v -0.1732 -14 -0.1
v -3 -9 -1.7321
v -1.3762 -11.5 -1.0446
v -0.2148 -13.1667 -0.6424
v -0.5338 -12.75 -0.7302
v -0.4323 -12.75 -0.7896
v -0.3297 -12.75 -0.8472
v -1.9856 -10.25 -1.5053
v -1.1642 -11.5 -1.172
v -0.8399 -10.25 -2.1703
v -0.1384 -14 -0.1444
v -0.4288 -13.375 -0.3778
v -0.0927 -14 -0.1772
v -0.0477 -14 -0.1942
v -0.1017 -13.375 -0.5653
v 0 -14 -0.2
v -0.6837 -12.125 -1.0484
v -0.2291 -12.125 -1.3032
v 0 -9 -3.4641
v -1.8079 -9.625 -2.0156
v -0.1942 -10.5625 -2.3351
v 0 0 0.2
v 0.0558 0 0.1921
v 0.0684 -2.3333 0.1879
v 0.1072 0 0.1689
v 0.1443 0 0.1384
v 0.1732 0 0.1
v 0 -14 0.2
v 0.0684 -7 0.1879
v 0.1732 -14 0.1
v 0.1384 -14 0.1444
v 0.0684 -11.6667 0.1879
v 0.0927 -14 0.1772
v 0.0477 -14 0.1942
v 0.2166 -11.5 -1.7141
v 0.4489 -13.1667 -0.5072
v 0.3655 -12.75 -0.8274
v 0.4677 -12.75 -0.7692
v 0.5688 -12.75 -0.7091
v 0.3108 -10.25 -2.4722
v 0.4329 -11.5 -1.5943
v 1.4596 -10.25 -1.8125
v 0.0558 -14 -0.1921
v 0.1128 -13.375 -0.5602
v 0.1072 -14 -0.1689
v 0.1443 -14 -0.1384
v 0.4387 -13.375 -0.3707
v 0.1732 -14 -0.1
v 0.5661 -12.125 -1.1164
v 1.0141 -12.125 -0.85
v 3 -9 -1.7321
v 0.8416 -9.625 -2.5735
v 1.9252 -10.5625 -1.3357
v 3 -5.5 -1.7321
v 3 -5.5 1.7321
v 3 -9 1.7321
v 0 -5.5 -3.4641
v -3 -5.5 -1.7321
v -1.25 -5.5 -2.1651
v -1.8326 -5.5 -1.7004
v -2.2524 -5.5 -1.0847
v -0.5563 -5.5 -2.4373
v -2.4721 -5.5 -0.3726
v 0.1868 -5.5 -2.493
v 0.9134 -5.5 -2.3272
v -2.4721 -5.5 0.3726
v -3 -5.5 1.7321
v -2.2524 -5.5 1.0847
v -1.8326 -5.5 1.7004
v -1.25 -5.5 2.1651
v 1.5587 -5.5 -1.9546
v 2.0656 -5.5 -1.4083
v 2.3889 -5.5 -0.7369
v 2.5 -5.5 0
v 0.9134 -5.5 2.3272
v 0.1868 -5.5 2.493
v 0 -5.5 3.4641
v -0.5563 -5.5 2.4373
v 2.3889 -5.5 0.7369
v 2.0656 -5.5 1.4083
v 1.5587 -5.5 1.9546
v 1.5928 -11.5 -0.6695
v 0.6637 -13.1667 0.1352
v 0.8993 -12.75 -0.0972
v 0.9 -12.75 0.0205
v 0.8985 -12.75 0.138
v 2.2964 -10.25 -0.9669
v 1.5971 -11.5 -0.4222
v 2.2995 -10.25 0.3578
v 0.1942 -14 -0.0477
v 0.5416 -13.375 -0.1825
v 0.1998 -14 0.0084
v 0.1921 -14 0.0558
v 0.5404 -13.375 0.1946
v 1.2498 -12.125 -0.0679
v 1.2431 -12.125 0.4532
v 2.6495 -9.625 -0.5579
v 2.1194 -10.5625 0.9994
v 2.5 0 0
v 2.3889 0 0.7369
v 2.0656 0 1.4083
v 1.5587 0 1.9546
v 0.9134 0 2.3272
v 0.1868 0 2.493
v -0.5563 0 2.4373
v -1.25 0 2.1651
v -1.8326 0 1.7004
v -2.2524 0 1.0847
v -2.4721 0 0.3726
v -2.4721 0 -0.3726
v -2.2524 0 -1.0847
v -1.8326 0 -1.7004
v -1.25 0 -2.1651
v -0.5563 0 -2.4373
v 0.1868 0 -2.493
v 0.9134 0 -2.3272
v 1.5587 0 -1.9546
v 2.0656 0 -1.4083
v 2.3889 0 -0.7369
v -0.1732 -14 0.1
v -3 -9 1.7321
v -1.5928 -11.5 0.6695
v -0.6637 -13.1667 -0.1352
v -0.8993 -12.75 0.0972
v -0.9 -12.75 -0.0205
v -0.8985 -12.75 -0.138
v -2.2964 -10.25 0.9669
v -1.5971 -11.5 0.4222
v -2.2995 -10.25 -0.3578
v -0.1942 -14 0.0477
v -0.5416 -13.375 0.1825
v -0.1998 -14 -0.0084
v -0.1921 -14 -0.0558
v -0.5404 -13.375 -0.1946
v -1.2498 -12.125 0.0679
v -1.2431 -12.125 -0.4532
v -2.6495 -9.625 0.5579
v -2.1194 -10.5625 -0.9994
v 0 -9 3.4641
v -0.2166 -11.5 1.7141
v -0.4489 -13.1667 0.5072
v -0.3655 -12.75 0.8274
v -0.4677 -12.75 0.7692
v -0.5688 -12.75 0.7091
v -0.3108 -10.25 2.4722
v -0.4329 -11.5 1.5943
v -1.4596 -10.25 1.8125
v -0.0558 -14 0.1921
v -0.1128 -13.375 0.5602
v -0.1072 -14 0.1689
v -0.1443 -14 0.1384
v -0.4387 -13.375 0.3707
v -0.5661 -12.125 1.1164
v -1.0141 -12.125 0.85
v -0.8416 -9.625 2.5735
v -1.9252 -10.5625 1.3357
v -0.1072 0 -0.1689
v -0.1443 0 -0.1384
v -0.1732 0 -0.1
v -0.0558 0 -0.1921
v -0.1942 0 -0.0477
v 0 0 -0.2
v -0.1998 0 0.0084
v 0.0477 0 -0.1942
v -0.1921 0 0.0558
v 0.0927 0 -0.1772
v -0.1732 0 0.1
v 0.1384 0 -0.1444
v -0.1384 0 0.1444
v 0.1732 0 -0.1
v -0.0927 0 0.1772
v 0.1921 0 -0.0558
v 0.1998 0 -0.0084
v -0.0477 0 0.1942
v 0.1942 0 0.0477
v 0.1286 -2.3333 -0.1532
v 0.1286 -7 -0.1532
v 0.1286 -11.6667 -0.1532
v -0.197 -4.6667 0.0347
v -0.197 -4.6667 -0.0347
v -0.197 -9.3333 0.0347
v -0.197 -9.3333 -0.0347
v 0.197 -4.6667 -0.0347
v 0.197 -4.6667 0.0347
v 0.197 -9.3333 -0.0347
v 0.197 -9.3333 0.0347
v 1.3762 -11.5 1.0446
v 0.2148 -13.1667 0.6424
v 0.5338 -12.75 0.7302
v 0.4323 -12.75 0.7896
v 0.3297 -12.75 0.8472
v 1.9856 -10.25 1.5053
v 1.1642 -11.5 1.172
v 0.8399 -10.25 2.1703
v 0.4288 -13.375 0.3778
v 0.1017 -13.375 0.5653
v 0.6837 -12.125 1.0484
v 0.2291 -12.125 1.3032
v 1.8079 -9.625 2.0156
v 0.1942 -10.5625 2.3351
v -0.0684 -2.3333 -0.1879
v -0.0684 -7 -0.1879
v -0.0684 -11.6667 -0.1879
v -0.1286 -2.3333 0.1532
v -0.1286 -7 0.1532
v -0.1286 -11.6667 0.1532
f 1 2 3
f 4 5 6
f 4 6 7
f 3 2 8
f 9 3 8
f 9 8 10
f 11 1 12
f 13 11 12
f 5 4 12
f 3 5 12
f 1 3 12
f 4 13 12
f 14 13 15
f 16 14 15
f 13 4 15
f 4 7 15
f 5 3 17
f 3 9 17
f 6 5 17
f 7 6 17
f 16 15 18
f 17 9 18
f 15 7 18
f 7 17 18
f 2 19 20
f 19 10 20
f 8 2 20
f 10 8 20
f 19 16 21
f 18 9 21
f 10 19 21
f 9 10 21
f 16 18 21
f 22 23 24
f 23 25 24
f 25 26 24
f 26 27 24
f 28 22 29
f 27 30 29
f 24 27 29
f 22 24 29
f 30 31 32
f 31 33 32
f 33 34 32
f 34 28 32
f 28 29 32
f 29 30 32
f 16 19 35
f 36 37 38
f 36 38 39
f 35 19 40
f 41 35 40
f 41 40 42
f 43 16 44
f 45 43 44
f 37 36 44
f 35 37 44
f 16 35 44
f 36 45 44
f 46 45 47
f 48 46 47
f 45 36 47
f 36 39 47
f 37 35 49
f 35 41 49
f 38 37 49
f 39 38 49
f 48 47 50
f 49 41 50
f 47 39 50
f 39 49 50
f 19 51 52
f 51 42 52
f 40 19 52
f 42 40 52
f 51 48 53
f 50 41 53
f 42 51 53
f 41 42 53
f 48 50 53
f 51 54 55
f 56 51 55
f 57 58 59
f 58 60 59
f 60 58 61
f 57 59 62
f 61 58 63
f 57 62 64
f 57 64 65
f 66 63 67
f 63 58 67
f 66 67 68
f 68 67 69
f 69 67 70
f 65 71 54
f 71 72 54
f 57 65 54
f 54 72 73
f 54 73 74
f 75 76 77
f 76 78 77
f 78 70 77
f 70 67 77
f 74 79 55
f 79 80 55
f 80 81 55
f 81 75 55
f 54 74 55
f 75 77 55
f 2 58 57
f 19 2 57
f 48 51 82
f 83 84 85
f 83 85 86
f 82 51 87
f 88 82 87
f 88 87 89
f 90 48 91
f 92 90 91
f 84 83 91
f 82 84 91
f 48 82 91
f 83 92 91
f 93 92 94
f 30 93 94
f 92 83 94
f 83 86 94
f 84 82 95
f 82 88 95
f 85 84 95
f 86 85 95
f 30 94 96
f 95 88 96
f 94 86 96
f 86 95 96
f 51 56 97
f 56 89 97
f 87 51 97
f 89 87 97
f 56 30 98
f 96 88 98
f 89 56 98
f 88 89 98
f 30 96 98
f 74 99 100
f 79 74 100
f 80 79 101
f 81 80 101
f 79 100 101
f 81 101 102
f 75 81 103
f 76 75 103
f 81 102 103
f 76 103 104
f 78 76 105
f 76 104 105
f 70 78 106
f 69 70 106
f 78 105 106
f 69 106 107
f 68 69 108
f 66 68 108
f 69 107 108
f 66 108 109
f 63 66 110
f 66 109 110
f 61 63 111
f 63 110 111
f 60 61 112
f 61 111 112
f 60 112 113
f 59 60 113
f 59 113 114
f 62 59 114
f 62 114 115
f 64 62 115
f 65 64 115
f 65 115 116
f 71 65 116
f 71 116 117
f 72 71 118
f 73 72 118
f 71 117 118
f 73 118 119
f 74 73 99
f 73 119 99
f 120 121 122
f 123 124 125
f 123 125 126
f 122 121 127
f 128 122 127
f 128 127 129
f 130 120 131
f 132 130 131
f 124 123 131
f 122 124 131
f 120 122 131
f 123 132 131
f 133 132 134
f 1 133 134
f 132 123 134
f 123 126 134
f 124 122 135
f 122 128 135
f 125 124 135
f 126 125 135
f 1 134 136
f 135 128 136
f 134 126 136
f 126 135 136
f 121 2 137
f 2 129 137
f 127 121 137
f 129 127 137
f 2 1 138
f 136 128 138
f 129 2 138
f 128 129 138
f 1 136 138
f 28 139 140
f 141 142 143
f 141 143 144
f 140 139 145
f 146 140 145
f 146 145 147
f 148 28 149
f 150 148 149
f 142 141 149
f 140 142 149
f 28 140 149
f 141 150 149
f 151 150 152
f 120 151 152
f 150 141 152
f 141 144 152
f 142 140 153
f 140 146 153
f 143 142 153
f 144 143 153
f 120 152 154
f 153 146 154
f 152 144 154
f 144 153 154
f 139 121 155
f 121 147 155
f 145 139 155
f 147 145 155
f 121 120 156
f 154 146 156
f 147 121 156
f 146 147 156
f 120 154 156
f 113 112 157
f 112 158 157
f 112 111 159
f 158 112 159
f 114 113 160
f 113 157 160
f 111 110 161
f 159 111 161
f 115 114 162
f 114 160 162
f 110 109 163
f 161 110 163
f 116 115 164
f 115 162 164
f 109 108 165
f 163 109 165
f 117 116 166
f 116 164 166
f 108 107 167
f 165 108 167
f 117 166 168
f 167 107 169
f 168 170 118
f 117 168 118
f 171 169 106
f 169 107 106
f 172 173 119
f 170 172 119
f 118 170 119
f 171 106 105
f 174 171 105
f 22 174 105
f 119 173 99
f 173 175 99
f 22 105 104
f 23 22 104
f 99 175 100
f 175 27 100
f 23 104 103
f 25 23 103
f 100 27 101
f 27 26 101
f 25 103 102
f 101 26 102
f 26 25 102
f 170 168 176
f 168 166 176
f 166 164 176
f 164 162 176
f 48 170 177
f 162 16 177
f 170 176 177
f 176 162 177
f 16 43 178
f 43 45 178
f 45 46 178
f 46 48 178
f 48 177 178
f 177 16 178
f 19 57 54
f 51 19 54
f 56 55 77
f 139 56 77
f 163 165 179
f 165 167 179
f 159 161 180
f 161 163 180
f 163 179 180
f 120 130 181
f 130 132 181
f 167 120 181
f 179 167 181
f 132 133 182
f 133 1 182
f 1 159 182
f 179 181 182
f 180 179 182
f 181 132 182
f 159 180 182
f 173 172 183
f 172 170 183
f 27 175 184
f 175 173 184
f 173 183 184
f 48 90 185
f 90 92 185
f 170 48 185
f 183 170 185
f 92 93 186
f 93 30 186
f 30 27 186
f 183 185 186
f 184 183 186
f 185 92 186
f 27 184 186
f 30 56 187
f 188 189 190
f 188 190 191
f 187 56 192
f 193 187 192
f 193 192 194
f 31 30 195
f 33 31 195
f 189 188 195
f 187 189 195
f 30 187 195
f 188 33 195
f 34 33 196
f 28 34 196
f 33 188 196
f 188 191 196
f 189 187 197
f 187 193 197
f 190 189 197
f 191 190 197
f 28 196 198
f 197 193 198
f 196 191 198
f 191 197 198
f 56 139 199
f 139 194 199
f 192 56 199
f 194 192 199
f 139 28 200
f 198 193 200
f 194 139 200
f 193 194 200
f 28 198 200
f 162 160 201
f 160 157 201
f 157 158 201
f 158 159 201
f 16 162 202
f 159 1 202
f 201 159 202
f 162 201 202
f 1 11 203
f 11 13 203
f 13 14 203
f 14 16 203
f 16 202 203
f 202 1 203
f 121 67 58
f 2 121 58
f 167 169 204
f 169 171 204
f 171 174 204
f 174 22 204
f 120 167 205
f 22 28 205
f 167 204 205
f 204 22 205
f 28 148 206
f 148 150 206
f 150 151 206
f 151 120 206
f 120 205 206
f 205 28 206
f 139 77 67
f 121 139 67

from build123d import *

# Parameters (mm, degrees)
F0_R     = 2.5
F1_DEPTH = 5.5
F2_R     = 2.5
F3_DEPTH = 3.5
F7_DEPTH = 25


# Not quite as in the source:
# - the arcs of a loft's sections are written as splines that run evenly, so that the points pair up as in the source's solid


with BuildPart() as f1:
    # F0 (on Front) → F1 (new body)
    with BuildSketch(Plane.XZ):
        Circle(F0_R)
    extrude(amount=F1_DEPTH)

    # F2 (on face) → F3 (join)
    with BuildSketch(Plane.XZ.offset(5.5)):
        Polygon((3, -1.7320508076), (3, 1.7320508076), (0, 3.4641016151), (-3, 1.7320508076), (-3, -1.7320508076), (0, -3.4641016151), align=None)
        Circle(F2_R, mode=Mode.SUBTRACT)
        Circle(F2_R)
    extrude(amount=F3_DEPTH)

    # F5 (on offset) → F6 section 0
    with BuildSketch(Plane.XZ.offset(14)):
        with BuildLine():
            add(Edge.make_bspline(
                [(0.1732050808, -0.1), (0.1848406091, -0.0798466737), (0.192920574, -0.0576471526), (0.2010025272, -0.0118121185), (0.2010025272, 0.0118121185), (0.192920574, 0.0576471526), (0.1848406091, 0.0798466737), (0.1732050808, 0.1)],
                knots=[0, 0, 0, 0, 0.3333333333, 0.3333333333, 0.6666666667, 0.6666666667, 1, 1, 1, 1], degree=3))
            add(Edge.make_bspline(
                [(0.1732050808, 0.1), (0.1615695524, 0.1201533263), (0.1463841856, 0.1382505417), (0.1107308583, 0.1681672355), (0.0902716689, 0.179979354), (0.0465363884, 0.1958976943), (0.0232710567, 0.2), (0, 0.2)],
                knots=[0, 0, 0, 0, 0.3333333333, 0.3333333333, 0.6666666667, 0.6666666667, 1, 1, 1, 1], degree=3))
            add(Edge.make_bspline(
                [(0, 0.2), (-0.0232710567, 0.2), (-0.0465363884, 0.1958976943), (-0.0902716689, 0.179979354), (-0.1107308583, 0.1681672355), (-0.1463841856, 0.1382505417), (-0.1615695524, 0.1201533263), (-0.1732050808, 0.1)],
                knots=[0, 0, 0, 0, 0.3333333333, 0.3333333333, 0.6666666667, 0.6666666667, 1, 1, 1, 1], degree=3))
            add(Edge.make_bspline(
                [(-0.1732050808, 0.1), (-0.1848406091, 0.0798466737), (-0.192920574, 0.0576471526), (-0.2010025272, 0.0118121185), (-0.2010025272, -0.0118121185), (-0.192920574, -0.0576471526), (-0.1848406091, -0.0798466737), (-0.1732050808, -0.1)],
                knots=[0, 0, 0, 0, 0.3333333333, 0.3333333333, 0.6666666667, 0.6666666667, 1, 1, 1, 1], degree=3))
            add(Edge.make_bspline(
                [(-0.1732050808, -0.1), (-0.1615695524, -0.1201533263), (-0.1463841856, -0.1382505417), (-0.1107308583, -0.1681672355), (-0.0902716689, -0.179979354), (-0.0465363884, -0.1958976943), (-0.0232710567, -0.2), (0, -0.2)],
                knots=[0, 0, 0, 0, 0.3333333333, 0.3333333333, 0.6666666667, 0.6666666667, 1, 1, 1, 1], degree=3))
            add(Edge.make_bspline(
                [(0, -0.2), (0.0232710567, -0.2), (0.0465363884, -0.1958976943), (0.0902716689, -0.179979354), (0.1107308583, -0.1681672355), (0.1463841856, -0.1382505417), (0.1615695524, -0.1201533263), (0.1732050808, -0.1)],
                knots=[0, 0, 0, 0, 0.3333333333, 0.3333333333, 0.6666666667, 0.6666666667, 1, 1, 1, 1], degree=3))
        make_face()
    # F3_face (on face) → F6 section 1
    with BuildSketch(Plane.XZ.offset(9)):
        Polygon((3, -1.7320508076), (3, 1.7320508076), (0, 3.4641016151), (-3, 1.7320508076), (-3, -1.7320508076), (0, -3.4641016151), align=None)
    loft(ruled=True)

    # F7 (cut): a face of the model
    f7_faces = [f1.faces().sort_by_distance(p)[0] for p in [
        (0, -14, 0),
    ]]
    extrude(f7_faces, amount=-F7_DEPTH, mode=Mode.SUBTRACT)


solid = f1.part
